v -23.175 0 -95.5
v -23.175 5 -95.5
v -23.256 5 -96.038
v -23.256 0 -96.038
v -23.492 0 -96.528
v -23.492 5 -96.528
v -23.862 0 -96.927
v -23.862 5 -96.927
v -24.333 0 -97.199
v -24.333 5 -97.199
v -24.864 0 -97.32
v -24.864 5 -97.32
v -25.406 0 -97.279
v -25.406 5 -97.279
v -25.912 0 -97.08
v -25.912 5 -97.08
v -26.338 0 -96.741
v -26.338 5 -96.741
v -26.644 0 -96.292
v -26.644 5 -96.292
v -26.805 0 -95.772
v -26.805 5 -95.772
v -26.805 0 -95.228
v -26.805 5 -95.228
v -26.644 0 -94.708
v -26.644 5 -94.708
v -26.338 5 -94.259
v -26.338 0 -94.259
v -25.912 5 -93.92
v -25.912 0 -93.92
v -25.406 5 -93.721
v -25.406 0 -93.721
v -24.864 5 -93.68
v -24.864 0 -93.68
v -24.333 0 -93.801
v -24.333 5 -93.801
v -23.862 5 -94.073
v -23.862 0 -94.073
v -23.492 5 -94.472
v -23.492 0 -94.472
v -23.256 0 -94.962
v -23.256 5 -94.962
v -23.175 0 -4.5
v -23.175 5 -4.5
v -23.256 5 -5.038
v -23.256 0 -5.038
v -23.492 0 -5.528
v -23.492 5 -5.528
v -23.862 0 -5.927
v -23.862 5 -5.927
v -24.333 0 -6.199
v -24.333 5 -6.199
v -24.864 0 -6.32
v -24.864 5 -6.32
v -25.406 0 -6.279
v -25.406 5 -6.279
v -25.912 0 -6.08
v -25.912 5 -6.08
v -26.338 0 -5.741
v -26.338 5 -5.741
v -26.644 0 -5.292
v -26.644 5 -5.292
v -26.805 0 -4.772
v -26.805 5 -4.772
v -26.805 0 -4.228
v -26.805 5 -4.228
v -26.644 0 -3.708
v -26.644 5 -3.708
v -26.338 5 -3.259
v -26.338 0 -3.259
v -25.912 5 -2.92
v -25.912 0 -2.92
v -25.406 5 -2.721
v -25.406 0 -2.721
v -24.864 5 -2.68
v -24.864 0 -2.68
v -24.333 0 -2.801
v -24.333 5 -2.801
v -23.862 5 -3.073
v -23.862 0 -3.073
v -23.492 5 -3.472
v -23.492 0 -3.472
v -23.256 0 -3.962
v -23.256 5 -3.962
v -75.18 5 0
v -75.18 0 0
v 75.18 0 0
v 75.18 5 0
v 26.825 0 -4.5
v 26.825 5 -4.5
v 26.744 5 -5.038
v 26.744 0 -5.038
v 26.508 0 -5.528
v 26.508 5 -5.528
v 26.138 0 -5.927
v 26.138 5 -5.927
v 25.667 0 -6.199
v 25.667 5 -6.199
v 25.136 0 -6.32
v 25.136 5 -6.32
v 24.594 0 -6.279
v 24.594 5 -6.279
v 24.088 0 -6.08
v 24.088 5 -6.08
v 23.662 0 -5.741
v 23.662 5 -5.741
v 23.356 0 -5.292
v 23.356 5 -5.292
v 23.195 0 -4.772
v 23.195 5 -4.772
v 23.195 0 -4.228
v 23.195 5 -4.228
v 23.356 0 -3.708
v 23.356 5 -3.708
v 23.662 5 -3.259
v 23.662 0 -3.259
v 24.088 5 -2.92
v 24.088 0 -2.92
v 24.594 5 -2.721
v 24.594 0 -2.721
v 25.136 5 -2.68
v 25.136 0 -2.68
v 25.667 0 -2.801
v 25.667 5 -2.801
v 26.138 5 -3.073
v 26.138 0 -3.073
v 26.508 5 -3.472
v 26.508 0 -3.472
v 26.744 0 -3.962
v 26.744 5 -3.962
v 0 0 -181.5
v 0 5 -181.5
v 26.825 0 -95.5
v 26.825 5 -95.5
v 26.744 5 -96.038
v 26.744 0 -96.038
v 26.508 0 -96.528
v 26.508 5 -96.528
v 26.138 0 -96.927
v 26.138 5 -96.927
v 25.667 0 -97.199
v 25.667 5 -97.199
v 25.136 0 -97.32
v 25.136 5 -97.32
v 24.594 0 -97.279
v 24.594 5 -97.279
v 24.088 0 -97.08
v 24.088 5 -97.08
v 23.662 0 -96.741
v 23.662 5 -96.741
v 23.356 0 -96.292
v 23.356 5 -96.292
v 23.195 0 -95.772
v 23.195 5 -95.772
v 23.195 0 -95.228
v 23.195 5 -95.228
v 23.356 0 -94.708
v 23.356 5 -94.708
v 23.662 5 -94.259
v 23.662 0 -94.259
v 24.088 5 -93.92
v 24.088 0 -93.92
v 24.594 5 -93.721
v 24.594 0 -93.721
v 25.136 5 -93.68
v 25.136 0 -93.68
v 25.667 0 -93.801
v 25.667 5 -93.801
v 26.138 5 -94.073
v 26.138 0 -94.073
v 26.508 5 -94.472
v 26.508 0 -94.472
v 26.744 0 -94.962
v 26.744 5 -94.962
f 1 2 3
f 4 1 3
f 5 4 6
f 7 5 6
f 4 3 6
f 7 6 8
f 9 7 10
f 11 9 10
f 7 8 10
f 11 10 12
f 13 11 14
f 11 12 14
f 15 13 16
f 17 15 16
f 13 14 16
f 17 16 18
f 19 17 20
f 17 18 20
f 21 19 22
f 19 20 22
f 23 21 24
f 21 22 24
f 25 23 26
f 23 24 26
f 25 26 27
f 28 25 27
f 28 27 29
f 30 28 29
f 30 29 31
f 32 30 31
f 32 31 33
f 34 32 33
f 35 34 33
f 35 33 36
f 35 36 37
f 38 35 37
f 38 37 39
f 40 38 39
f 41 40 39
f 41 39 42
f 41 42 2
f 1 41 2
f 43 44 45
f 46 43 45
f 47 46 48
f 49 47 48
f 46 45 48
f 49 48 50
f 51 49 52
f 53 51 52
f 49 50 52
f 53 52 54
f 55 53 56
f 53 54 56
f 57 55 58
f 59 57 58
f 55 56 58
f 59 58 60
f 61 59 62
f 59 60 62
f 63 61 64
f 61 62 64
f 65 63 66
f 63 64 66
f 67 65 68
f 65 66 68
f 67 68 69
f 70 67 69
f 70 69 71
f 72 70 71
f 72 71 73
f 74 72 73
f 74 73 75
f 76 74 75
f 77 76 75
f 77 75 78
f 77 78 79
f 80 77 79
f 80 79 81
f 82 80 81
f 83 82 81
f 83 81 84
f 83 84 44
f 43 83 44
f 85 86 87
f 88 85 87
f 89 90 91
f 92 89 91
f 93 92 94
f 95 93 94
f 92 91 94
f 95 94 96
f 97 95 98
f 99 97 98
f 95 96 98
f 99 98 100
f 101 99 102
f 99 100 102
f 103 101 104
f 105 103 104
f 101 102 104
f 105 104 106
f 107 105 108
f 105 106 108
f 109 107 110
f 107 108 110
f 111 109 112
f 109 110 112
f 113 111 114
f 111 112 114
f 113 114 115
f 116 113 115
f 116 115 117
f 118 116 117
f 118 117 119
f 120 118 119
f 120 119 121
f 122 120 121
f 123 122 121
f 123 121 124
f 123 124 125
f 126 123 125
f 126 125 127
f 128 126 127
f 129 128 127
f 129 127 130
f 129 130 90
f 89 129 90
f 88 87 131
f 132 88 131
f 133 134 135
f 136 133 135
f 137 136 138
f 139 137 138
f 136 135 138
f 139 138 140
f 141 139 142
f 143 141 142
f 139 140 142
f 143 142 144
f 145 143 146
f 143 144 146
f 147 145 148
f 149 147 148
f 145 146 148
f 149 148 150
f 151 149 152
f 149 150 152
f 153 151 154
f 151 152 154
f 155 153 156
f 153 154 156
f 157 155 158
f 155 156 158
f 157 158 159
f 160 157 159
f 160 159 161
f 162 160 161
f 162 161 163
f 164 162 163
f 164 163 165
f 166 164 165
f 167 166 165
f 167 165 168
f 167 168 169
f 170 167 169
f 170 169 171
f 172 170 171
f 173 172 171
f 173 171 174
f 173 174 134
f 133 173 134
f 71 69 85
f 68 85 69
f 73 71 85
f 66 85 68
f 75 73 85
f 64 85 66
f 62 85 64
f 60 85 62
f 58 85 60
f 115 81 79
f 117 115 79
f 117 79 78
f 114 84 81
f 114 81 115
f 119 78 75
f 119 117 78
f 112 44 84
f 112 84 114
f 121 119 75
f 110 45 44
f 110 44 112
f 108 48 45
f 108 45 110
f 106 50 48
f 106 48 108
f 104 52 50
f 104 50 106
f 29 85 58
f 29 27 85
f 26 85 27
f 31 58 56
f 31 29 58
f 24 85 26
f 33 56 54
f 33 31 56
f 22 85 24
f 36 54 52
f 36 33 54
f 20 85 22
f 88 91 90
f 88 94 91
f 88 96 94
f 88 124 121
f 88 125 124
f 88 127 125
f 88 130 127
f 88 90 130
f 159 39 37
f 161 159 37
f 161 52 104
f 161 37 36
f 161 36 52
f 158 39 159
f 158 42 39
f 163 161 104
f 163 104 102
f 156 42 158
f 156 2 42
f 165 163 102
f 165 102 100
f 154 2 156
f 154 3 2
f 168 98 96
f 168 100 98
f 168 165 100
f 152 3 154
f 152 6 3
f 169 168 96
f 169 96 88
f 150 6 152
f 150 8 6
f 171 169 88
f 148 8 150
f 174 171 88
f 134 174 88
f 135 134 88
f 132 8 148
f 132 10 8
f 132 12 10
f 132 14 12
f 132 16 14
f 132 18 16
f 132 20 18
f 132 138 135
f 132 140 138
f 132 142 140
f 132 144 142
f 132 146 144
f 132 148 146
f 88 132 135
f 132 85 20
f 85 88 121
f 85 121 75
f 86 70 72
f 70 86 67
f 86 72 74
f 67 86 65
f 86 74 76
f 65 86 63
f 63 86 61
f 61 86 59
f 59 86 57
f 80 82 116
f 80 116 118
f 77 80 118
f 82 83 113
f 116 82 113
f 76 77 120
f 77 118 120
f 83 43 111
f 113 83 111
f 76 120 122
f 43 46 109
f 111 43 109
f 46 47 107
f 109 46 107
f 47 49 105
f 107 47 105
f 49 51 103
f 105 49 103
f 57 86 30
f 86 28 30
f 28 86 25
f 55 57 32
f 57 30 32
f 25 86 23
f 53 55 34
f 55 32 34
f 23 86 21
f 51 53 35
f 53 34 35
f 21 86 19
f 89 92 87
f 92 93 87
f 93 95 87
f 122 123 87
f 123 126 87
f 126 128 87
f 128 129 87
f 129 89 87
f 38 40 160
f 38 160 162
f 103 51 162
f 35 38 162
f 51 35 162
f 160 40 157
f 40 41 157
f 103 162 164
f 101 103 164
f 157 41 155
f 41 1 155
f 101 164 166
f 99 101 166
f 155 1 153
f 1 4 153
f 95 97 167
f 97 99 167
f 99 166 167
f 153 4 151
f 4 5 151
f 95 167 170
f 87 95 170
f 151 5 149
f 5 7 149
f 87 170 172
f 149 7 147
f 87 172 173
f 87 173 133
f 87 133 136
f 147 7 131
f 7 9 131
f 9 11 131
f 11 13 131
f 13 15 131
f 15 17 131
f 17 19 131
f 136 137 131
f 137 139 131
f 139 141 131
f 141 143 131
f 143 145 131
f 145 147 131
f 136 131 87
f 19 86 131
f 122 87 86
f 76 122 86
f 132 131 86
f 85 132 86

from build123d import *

# Parameters (mm, degrees)
SKETCH1_R           = 2
BOSS_EXTRUDE1_DEPTH = 5
SKETCH3_W           = 64.166552172
SKETCH3_H           = 97.438097742
BOSS_EXTRUDE2_DEPTH = 5
SKETCH4_R           = 1.825
CUT_EXTRUDE1_DEPTH  = 10


with BuildPart() as part:
    # Sketch1 → Boss-Extrude1 (new body)
    with BuildSketch(Plane(origin=(0, 0, 0), x_dir=(1, 0, 0), z_dir=(0, 1, 0))):
        Polygon((75.179761571, 0), (0, 181.5), (-75.179761571, 0), align=None)
        with Locations((27.701843901, 4.378893659)):
            Circle(SKETCH1_R, mode=Mode.SUBTRACT)
        with Locations((-27.701843901, 4.378893659)):
            Circle(SKETCH1_R, mode=Mode.SUBTRACT)
        with Locations((-27.701843901, 95.621106341)):
            Circle(SKETCH1_R, mode=Mode.SUBTRACT)
        with Locations((27.701843901, 95.621106341)):
            Circle(SKETCH1_R, mode=Mode.SUBTRACT)
    extrude(amount=BOSS_EXTRUDE1_DEPTH)

    # Sketch3 → Boss-Extrude2 (add)
    with BuildSketch(Plane(origin=(0, 5, 0), x_dir=(1, 0, 0), z_dir=(0, 1, 0))):
        with Locations((-0.392642939, 50.723354507)):
            Rectangle(SKETCH3_W, SKETCH3_H)
    extrude(amount=-BOSS_EXTRUDE2_DEPTH)

    # Sketch4 → Cut-Extrude1 (cut)
    with BuildSketch(Plane(origin=(0, 5, 0), x_dir=(1, 0, 0), z_dir=(0, 1, 0))):
        with Locations((-25, 4.5)):
            Circle(SKETCH4_R)
        with Locations((25, 4.5)):
            Circle(SKETCH4_R)
        with Locations((25, 95.5)):
            Circle(SKETCH4_R)
        with Locations((-25, 95.5)):
            Circle(SKETCH4_R)
    extrude(amount=-CUT_EXTRUDE1_DEPTH, mode=Mode.SUBTRACT)


solid = part.part
